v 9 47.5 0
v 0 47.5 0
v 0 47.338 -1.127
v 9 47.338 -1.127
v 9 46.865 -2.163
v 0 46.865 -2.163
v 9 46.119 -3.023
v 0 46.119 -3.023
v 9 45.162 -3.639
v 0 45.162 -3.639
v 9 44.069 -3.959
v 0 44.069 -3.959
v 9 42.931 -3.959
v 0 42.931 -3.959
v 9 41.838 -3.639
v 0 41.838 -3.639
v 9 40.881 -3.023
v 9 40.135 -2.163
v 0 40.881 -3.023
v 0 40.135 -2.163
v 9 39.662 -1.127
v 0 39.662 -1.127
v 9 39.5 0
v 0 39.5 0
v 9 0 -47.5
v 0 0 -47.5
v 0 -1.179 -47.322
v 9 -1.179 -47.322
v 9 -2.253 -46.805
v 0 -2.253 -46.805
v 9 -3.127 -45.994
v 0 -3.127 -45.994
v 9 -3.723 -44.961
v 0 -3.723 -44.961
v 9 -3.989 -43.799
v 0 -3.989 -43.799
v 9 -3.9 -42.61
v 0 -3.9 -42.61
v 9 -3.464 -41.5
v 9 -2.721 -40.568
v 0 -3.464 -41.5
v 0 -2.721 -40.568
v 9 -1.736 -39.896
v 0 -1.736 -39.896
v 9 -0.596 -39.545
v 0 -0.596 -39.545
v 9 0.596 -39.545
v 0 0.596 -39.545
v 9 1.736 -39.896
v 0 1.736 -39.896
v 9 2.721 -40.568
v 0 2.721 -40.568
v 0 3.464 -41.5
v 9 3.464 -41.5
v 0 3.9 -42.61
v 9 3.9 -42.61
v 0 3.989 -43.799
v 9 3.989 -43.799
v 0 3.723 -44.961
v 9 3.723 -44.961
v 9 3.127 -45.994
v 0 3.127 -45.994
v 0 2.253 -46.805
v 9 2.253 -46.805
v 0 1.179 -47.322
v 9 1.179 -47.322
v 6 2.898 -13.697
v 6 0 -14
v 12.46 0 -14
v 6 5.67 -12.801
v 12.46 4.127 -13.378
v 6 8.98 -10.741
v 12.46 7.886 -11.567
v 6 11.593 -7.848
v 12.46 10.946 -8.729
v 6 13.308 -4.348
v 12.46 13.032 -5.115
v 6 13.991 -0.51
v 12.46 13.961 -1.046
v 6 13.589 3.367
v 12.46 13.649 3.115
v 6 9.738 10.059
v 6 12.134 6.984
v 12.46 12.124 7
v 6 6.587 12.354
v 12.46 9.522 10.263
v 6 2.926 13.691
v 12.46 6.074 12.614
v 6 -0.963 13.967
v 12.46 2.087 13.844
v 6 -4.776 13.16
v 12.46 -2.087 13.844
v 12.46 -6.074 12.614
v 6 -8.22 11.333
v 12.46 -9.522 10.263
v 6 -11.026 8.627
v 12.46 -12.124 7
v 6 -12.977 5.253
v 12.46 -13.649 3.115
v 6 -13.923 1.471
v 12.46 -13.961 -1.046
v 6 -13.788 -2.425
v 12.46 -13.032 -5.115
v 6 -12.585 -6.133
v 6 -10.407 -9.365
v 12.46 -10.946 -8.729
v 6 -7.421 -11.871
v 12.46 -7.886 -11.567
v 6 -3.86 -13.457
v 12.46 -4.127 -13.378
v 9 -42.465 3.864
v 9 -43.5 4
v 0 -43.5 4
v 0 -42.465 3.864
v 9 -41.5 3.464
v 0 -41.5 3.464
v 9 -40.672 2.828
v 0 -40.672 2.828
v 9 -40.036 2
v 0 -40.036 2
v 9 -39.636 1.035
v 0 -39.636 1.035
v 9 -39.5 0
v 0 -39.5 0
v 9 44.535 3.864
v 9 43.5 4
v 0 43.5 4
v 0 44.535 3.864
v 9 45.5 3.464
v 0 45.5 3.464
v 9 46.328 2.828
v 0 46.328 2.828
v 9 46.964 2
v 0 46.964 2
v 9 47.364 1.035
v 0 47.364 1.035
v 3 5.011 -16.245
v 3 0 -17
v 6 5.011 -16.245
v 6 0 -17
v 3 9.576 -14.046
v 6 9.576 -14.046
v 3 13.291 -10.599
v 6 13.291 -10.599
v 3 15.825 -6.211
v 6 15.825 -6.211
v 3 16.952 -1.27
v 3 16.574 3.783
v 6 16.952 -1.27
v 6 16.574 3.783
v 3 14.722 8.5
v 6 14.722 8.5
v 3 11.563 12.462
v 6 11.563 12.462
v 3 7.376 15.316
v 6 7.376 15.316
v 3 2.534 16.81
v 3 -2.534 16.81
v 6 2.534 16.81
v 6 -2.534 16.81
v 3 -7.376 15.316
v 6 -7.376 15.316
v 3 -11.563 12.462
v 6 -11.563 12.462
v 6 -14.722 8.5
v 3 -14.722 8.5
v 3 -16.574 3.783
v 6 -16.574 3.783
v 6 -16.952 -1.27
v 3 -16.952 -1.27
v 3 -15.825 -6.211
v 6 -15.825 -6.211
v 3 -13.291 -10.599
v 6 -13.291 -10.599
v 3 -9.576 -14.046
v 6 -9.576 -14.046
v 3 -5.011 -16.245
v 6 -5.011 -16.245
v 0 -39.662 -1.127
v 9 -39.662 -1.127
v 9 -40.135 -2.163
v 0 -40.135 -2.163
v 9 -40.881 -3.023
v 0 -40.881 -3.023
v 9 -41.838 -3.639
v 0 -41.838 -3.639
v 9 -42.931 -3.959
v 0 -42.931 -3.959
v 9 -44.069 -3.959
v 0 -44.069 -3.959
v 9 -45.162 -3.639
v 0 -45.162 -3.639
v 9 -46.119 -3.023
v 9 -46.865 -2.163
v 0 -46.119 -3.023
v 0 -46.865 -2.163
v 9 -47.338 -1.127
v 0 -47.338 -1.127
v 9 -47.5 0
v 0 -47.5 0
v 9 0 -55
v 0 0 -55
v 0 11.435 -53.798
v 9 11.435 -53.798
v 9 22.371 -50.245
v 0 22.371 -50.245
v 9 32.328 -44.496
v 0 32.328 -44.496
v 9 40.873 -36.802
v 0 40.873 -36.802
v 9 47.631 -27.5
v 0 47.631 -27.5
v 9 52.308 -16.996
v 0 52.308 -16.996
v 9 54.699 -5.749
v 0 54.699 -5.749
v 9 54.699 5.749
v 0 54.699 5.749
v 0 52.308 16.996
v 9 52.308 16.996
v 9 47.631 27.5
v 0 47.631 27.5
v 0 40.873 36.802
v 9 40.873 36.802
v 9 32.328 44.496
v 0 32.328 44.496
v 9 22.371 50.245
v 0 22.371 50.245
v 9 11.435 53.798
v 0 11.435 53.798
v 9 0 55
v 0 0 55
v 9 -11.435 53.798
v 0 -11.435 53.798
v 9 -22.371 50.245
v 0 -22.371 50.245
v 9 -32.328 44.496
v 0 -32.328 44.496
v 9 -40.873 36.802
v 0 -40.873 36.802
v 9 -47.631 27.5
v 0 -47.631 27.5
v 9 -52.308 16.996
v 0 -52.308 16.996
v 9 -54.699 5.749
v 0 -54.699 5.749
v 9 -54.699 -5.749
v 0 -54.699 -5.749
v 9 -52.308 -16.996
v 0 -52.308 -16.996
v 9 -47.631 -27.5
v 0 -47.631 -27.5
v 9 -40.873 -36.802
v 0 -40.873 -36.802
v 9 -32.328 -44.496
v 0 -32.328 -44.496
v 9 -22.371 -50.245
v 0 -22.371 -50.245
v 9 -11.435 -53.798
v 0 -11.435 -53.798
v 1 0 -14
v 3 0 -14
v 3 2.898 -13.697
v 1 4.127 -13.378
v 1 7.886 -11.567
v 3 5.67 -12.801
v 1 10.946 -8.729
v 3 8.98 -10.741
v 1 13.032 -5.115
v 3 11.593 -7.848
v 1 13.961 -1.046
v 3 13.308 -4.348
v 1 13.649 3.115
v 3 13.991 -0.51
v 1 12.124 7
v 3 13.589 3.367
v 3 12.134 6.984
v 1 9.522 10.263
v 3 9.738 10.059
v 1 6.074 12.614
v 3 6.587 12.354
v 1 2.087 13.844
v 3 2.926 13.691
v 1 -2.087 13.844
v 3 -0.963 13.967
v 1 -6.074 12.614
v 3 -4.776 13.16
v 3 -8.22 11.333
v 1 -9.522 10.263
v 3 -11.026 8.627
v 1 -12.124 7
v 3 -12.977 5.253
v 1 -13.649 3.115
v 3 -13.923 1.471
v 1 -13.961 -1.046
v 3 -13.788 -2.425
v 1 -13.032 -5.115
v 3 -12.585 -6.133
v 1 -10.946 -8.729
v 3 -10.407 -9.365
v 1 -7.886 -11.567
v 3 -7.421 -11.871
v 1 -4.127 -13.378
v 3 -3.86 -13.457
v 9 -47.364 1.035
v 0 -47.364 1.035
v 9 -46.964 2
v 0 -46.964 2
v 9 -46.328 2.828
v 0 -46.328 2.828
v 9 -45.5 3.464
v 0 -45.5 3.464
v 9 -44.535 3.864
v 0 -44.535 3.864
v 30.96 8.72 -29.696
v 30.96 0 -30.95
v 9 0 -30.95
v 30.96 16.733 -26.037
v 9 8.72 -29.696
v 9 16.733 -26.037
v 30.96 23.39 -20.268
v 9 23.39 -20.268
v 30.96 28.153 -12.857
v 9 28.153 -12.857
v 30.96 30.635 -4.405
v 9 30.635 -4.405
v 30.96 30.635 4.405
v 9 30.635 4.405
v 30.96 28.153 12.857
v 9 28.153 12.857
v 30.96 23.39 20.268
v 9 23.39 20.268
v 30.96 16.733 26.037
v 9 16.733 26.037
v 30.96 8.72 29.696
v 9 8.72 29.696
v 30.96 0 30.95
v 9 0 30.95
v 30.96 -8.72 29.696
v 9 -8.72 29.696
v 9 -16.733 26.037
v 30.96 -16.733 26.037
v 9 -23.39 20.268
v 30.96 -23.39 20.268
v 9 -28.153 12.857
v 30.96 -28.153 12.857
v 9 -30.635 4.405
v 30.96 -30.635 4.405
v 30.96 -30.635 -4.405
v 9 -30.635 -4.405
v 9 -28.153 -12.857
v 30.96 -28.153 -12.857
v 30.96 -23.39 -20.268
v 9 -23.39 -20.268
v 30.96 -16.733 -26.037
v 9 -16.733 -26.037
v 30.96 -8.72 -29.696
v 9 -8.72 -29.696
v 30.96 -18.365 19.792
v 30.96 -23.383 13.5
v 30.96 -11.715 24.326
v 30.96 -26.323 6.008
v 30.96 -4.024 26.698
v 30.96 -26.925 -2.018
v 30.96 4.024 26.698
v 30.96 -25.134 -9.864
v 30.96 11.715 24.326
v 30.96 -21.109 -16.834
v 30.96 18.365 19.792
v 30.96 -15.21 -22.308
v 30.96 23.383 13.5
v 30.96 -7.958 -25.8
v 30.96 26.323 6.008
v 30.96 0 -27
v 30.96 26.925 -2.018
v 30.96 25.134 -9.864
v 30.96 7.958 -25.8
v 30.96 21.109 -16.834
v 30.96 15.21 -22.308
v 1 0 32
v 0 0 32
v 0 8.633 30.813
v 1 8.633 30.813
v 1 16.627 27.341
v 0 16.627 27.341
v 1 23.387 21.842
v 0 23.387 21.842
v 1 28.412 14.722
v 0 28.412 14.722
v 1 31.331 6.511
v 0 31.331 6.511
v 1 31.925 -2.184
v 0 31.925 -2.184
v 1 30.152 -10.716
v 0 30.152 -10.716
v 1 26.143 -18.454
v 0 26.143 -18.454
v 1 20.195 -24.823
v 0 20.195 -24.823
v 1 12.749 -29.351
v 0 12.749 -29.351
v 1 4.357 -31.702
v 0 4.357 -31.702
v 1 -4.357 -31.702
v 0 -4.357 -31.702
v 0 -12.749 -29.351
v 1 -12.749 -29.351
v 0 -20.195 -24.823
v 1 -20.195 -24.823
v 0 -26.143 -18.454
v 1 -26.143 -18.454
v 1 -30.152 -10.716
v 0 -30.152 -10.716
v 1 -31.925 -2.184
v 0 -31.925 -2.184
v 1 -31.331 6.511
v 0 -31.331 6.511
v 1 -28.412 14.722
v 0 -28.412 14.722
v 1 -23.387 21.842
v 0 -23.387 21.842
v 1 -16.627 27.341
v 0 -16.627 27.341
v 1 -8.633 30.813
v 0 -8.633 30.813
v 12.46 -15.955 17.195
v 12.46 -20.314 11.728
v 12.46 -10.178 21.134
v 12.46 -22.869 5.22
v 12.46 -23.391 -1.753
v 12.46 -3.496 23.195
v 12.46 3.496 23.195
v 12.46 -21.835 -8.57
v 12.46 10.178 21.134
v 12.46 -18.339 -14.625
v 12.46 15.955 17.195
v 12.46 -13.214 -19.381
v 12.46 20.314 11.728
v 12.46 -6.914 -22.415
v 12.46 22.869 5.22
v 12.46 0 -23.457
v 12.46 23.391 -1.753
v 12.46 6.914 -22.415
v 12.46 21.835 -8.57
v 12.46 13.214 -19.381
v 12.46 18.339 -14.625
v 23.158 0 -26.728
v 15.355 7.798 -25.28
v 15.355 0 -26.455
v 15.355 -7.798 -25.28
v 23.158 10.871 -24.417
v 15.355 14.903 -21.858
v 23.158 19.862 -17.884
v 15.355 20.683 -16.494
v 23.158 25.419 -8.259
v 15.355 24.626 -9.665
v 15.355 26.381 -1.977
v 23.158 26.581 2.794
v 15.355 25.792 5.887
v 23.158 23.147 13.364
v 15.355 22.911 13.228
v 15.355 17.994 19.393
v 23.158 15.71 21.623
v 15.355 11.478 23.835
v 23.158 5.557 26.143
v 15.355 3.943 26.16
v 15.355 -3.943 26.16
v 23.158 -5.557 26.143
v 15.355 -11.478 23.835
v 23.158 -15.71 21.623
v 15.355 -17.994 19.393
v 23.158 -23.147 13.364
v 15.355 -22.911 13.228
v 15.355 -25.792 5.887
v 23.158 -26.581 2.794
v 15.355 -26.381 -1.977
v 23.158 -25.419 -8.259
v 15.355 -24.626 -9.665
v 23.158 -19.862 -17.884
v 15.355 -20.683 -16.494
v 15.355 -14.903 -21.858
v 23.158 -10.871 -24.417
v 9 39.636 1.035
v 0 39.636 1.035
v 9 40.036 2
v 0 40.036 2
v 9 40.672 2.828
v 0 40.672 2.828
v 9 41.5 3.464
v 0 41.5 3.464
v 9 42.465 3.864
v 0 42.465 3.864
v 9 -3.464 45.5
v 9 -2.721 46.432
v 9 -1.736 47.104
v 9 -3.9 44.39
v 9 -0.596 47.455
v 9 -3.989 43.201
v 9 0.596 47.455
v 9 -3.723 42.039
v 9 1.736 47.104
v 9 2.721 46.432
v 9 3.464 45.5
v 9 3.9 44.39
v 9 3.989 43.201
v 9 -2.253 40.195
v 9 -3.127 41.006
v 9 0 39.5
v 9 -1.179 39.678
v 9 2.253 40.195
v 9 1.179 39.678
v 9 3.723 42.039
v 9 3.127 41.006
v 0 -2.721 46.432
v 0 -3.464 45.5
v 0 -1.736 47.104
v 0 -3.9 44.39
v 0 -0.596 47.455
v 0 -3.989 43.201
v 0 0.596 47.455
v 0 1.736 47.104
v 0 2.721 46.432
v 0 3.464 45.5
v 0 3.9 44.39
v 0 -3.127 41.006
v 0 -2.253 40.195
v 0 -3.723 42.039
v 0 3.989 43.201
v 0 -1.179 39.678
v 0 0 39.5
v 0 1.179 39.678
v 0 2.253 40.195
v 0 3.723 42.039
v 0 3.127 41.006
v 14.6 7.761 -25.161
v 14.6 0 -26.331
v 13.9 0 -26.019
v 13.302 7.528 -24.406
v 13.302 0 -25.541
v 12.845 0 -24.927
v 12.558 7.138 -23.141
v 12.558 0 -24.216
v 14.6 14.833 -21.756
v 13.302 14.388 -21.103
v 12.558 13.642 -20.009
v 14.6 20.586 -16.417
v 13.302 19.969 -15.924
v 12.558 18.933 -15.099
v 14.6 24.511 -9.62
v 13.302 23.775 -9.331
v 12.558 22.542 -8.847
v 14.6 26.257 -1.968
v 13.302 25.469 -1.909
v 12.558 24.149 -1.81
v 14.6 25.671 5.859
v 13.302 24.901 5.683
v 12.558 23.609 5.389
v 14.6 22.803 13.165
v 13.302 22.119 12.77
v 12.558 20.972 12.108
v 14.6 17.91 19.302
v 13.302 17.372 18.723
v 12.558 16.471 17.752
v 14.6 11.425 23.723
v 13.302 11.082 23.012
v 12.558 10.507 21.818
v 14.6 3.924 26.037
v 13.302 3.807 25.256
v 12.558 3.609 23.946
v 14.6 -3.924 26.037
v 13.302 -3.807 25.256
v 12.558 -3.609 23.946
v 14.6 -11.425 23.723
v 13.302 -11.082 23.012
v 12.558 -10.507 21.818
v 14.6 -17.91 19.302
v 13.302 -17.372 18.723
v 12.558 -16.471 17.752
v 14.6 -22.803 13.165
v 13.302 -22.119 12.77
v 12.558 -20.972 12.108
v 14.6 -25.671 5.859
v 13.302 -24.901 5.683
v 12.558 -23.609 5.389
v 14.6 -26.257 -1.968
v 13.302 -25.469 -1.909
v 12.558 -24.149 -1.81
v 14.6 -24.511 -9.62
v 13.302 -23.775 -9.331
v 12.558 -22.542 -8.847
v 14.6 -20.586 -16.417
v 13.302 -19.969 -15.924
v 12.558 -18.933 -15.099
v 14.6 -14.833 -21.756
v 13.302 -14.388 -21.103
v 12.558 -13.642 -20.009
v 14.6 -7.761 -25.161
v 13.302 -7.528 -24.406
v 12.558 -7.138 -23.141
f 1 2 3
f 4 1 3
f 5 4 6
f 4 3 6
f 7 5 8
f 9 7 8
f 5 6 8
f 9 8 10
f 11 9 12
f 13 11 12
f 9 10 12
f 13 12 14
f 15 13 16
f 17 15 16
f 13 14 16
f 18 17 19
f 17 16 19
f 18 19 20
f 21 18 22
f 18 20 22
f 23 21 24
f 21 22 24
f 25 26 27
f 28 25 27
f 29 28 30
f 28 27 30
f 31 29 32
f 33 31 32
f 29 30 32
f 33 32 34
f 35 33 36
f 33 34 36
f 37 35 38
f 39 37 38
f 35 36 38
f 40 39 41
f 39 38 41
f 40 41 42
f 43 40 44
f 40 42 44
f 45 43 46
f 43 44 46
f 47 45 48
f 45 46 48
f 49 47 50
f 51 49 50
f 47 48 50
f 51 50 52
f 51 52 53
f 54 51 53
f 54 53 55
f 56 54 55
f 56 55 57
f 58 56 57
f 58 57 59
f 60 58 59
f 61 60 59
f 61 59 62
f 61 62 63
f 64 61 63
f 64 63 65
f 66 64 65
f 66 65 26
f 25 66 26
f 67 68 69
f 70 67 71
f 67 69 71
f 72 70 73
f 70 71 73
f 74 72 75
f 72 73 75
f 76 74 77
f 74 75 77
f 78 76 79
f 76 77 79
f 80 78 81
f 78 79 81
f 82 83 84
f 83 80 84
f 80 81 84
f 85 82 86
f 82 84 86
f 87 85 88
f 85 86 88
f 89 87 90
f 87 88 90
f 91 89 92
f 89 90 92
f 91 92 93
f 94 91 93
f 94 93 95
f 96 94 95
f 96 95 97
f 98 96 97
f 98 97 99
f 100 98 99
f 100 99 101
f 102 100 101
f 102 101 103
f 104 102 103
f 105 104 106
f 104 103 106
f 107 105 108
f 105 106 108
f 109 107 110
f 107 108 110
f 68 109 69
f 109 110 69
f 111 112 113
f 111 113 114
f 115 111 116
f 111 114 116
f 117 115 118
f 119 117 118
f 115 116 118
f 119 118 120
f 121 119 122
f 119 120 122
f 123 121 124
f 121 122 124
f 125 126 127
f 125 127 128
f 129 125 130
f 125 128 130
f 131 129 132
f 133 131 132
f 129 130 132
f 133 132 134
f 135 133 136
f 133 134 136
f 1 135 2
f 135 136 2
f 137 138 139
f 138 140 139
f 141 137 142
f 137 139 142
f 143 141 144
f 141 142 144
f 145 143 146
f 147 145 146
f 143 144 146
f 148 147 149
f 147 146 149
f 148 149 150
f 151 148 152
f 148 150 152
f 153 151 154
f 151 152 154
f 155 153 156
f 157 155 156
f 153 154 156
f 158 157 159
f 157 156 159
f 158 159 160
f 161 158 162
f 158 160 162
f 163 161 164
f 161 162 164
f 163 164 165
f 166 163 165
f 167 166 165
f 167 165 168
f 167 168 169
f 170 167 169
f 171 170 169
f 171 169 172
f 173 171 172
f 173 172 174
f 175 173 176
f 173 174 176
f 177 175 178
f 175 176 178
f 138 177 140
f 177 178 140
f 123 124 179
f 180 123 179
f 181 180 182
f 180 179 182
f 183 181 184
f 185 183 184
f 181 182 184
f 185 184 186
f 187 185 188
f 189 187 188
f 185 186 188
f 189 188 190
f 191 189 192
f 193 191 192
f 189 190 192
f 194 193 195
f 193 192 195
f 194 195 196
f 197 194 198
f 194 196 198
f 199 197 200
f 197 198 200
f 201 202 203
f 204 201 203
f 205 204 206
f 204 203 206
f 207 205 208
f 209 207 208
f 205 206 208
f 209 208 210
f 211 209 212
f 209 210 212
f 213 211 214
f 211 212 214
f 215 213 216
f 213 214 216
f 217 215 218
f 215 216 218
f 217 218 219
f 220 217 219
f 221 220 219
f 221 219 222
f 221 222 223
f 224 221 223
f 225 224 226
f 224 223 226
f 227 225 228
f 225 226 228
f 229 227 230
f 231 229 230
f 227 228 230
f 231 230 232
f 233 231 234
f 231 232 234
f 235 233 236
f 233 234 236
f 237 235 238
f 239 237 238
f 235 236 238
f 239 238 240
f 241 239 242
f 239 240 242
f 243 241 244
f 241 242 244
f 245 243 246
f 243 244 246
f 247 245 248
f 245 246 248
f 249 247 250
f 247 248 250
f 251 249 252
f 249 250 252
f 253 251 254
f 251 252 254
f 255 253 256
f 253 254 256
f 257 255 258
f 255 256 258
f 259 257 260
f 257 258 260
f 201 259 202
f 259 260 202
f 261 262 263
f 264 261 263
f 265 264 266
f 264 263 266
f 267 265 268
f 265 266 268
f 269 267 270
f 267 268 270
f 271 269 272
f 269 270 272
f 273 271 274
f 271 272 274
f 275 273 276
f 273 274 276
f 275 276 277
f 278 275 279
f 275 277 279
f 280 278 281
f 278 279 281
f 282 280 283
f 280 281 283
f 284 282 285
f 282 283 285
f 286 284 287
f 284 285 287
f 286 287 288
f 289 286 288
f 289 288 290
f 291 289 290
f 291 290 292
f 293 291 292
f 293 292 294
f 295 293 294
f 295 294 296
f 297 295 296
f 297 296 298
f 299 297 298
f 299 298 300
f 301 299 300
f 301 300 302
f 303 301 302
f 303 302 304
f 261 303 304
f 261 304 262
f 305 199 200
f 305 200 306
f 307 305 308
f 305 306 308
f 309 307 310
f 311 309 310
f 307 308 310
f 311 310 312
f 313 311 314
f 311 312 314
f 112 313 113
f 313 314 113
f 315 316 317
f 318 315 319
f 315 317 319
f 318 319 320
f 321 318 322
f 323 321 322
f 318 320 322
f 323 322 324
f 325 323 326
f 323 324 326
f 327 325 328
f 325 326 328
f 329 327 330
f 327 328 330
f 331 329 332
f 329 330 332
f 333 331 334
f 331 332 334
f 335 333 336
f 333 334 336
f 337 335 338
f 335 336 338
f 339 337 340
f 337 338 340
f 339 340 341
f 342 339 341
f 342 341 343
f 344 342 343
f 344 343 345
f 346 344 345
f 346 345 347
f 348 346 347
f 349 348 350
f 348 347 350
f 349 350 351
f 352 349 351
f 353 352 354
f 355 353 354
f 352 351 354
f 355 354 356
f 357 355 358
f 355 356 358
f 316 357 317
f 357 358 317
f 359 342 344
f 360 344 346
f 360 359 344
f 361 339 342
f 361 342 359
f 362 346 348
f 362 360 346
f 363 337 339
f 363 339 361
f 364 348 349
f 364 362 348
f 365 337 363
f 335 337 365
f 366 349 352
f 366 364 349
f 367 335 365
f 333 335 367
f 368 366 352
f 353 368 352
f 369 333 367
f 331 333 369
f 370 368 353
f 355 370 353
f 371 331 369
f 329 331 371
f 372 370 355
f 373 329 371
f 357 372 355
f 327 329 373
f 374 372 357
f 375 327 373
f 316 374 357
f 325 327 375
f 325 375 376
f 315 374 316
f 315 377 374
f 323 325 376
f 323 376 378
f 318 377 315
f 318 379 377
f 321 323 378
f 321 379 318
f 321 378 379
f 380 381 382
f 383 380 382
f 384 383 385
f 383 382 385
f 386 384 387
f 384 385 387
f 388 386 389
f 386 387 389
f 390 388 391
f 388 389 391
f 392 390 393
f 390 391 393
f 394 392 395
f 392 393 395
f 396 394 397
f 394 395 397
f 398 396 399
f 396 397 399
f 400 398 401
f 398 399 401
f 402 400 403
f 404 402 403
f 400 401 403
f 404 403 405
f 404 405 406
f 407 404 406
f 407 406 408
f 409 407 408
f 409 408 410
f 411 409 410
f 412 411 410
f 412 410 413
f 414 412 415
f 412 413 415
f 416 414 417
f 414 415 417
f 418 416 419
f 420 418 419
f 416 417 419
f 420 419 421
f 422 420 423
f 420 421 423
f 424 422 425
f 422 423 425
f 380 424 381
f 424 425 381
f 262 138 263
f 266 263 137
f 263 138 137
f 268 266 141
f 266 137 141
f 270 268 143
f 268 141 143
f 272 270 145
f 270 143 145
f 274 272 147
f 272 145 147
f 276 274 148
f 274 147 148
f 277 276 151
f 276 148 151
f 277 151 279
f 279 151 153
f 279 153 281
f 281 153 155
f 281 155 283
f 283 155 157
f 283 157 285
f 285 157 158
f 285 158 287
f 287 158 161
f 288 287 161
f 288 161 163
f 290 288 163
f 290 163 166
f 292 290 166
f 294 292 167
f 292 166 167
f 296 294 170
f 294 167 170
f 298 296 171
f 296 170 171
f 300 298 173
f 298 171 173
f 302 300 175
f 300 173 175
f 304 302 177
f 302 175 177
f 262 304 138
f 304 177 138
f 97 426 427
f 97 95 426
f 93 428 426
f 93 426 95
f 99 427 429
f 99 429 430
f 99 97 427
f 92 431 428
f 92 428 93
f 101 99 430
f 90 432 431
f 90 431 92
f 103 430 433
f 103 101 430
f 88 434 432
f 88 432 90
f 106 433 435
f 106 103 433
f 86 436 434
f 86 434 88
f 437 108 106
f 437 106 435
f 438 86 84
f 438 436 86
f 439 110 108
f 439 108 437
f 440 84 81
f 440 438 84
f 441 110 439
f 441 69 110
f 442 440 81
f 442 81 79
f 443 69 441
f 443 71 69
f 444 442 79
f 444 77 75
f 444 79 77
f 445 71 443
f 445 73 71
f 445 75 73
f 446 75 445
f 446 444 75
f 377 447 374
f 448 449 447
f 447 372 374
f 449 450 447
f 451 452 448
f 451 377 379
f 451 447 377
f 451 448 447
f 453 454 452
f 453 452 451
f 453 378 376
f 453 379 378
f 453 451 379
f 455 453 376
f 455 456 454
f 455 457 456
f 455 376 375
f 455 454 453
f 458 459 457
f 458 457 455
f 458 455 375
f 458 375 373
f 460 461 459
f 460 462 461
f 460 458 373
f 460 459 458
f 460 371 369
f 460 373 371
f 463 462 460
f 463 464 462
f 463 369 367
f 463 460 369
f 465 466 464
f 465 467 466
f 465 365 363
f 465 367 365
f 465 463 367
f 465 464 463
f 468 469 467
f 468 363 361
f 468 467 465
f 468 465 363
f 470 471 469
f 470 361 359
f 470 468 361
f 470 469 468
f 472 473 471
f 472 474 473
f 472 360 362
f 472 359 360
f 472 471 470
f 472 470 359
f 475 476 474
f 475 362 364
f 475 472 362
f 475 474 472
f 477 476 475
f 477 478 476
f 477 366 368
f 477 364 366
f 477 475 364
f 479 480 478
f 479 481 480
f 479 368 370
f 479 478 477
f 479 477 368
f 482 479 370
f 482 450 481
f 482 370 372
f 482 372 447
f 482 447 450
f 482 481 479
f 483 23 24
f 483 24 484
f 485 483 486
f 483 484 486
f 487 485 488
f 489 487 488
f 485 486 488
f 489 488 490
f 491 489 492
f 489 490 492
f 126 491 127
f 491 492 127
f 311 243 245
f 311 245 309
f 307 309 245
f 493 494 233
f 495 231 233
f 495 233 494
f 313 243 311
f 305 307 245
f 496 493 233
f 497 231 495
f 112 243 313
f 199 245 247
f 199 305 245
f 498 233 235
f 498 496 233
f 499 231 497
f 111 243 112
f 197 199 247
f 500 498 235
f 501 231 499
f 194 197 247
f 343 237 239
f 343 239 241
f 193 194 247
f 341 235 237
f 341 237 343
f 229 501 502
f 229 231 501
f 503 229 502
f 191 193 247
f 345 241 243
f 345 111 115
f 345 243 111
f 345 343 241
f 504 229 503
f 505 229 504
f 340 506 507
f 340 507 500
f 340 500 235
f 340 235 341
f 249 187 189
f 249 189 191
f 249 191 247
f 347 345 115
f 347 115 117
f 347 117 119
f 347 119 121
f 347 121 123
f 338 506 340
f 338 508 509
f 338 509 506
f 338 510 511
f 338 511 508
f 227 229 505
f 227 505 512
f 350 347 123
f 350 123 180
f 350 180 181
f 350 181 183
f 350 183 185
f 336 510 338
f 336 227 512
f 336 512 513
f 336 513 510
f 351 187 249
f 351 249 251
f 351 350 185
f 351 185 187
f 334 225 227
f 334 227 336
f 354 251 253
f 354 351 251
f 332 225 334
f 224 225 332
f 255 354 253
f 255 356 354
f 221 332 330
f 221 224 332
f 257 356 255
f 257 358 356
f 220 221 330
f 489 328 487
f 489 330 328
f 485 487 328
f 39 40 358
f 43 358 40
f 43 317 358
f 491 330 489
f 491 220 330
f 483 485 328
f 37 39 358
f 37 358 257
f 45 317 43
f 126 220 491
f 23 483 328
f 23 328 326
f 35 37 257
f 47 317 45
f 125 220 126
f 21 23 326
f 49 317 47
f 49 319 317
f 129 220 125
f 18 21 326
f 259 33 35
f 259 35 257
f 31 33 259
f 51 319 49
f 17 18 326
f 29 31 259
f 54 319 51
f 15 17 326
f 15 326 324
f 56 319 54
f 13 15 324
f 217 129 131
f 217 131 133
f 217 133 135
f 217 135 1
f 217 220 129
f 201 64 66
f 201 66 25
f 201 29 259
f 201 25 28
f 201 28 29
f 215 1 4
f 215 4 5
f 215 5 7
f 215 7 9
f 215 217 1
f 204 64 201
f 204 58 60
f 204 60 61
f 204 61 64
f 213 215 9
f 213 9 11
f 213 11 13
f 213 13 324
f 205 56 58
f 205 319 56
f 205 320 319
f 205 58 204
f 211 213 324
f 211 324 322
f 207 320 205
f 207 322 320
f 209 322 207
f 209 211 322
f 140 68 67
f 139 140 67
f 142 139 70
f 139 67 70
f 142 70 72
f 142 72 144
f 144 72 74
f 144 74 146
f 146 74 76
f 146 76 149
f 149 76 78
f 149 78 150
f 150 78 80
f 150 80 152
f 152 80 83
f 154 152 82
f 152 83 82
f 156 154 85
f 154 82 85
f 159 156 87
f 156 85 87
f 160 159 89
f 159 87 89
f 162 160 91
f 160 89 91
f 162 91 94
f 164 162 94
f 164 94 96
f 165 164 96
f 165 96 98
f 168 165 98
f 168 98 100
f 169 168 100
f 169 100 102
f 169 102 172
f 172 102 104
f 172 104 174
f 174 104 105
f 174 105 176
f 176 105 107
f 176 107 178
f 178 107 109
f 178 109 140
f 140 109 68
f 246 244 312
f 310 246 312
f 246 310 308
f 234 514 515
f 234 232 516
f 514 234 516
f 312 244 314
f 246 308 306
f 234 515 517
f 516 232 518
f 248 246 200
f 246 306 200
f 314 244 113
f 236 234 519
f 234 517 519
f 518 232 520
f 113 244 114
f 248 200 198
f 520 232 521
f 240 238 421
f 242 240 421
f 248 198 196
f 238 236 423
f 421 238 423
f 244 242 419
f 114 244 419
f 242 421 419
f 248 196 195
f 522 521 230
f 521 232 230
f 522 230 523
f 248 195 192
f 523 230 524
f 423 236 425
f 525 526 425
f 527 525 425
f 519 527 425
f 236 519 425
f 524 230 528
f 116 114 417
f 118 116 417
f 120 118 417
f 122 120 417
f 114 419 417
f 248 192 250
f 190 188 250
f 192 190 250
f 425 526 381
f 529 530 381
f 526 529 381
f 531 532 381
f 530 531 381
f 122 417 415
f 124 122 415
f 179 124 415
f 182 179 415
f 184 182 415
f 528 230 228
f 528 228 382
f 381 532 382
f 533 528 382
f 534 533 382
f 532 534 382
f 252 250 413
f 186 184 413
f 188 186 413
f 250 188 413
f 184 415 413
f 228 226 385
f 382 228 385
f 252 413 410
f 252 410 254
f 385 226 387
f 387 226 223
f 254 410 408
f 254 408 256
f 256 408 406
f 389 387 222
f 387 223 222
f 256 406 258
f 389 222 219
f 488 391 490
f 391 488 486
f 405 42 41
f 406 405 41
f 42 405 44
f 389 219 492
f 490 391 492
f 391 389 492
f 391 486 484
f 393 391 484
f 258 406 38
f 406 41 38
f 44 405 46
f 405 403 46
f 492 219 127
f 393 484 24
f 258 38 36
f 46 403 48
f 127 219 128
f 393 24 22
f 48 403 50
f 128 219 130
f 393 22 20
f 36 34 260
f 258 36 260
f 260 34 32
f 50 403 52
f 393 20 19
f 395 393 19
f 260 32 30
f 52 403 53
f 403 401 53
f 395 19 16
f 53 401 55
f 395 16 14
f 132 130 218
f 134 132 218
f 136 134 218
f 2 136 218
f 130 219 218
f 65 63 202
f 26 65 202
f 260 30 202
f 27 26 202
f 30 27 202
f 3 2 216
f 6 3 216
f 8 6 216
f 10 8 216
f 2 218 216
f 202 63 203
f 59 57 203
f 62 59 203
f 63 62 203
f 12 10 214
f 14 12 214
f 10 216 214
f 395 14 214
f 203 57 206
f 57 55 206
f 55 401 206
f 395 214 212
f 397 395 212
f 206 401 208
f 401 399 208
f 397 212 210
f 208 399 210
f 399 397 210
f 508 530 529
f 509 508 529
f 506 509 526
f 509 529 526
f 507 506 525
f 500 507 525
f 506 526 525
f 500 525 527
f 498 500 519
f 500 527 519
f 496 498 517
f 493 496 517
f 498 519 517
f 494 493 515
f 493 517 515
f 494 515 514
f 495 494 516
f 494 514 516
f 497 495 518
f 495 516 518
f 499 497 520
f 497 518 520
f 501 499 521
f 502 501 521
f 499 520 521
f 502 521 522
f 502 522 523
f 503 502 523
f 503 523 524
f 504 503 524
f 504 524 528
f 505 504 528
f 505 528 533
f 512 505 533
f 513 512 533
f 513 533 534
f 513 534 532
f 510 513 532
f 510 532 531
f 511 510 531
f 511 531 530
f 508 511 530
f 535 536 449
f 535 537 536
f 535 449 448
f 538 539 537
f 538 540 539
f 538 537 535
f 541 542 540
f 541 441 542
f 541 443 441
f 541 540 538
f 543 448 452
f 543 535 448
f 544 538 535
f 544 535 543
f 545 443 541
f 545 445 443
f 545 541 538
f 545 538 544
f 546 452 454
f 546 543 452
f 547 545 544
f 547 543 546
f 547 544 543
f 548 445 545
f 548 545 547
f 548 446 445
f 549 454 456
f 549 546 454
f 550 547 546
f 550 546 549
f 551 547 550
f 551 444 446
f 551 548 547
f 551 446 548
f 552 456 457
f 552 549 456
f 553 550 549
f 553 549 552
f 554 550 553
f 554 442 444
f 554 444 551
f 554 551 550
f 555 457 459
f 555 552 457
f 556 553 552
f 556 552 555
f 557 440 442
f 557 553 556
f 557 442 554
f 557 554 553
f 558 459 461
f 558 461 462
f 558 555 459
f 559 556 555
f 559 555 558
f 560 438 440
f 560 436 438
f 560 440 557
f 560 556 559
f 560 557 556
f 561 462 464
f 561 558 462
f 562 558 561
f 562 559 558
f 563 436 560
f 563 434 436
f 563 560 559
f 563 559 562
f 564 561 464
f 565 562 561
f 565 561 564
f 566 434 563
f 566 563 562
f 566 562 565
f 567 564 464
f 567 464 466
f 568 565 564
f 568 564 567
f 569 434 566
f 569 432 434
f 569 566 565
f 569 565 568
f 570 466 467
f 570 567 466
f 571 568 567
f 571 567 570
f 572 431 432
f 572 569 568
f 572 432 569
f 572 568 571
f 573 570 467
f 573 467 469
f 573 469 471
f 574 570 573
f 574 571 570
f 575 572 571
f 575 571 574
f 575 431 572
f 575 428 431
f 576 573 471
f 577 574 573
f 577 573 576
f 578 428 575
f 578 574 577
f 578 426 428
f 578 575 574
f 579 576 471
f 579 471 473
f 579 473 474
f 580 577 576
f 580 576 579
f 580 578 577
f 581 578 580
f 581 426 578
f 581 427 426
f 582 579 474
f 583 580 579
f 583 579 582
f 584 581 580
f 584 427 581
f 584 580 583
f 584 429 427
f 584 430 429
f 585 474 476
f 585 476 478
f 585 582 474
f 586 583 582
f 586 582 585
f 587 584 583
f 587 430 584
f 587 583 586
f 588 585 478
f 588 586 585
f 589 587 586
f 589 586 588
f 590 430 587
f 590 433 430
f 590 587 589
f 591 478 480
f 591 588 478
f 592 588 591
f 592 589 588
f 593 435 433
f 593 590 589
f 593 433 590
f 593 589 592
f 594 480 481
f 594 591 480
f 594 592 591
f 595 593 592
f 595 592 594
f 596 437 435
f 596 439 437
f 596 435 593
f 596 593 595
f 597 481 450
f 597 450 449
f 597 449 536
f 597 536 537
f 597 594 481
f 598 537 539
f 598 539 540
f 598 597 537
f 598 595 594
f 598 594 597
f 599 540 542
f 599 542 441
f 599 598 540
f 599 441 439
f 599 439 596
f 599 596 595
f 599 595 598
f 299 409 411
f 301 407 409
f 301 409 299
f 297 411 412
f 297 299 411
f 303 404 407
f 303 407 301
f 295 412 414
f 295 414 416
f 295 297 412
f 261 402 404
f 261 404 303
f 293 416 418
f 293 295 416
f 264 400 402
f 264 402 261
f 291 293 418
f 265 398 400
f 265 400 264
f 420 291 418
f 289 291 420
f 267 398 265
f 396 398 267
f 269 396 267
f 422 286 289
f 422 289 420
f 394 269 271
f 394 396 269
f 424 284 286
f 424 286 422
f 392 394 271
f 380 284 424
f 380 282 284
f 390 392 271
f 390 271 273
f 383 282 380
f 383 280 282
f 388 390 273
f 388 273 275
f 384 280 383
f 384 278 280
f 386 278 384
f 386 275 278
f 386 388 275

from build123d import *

# Parameters (mm, degrees)
SKETCH_1_R          = 55
EXTRUDE_1_DEPTH     = 9
SKETCH_2_R          = 30.95
EXTRUDE_2_DEPTH     = 21.96
SKETCH_3_R          = 27
CUT_EXTRUDE_1_DEPTH = 18.5
CUT_EXTRUDE_1_TAPER = 2
FILLET_1_R          = 3
SKETCH_4_R          = 14
CUT_EXTRUDE_2_DEPTH = 18.5
SKETCH_5_W          = 3
SKETCH_5_H          = 6
SKETCH_7_R          = 32
CUT_EXTRUDE_3_DEPTH = 1
CUT_EXTRUDE_4_DEPTH = 20


with BuildPart() as part:
    # 草图1 → 凸台-拉伸1 (new body)
    with BuildSketch(Plane(origin=(0, 0, 0), x_dir=(0, 0, -1), z_dir=(1, 0, 0))):
        Circle(SKETCH_1_R)
    extrude(amount=EXTRUDE_1_DEPTH)

    # 草图2 → 凸台-拉伸2 (add)
    with BuildSketch(Plane(origin=(9, 0, 0), x_dir=(0, 0, -1), z_dir=(1, 0, 0))):
        Circle(SKETCH_2_R)
    extrude(amount=EXTRUDE_2_DEPTH)

    # 草图3 → 切除-拉伸1 (cut)
    with BuildSketch(Plane(origin=(30.96, 0, 0), x_dir=(0, 0, -1), z_dir=(1, 0, 0))):
        Circle(SKETCH_3_R)
    extrude(amount=-CUT_EXTRUDE_1_DEPTH, taper=CUT_EXTRUDE_1_TAPER, mode=Mode.SUBTRACT)

    # 圆角1
    fillet_1_edges = [part.edges().sort_by_distance(p)[0] for p in [
        (12.46, 0, 26.353965764),
    ]]
    fillet(fillet_1_edges, radius=FILLET_1_R)

    # 草图4 → 切除-拉伸2 (cut)
    with BuildSketch(Plane(origin=(12.46, 0, 0), x_dir=(0, 0, -1), z_dir=(1, 0, 0))):
        Circle(SKETCH_4_R)
    extrude(amount=-CUT_EXTRUDE_2_DEPTH, mode=Mode.SUBTRACT)

    # 切除-扫描1: sweep along a path in 草图6
    with BuildLine(Plane(origin=(4.5, 0, 14), x_dir=(0, 0, -1), z_dir=(1, 0, 0))) as sweep_1_path:
        CenterArc((14, 0), 14, 0, 360)
    # 草图5 → 切除-扫描1 (sweep, cut)
    with BuildSketch(Plane(origin=(0, 0, 0), x_dir=(1, 0, 0), z_dir=(0, 1, 0))):
        with Locations((4.5, -14)):
            Rectangle(SKETCH_5_W, SKETCH_5_H)
    sweep(path=sweep_1_path.line, mode=Mode.SUBTRACT)

    # 草图7 → 切除-拉伸3 (cut)
    with BuildSketch(Plane.ZY):
        Circle(SKETCH_7_R)
    extrude(amount=-CUT_EXTRUDE_3_DEPTH, mode=Mode.SUBTRACT)

    # 草图8 → 切除-拉伸4 (cut)
    with BuildSketch(Plane.ZY):
        with BuildLine():
            ThreePointArc((0, 47.5), (-4, 43.5), (0, 39.5))
            Line((0, 39.5), (0, 47.5))
        make_face()
        with BuildLine():
            Line((0, 47.5), (0, 39.5))
            ThreePointArc((0, 39.5), (2.828427125, 40.671572875), (4, 43.5))
            ThreePointArc((4, 43.5), (2.828427125, 46.328427125), (0, 47.5))
        make_face()
        with BuildLine():
            ThreePointArc((47.5, 0), (43.5, 4), (39.5, 0))
            Line((39.5, 0), (47.5, 0))
        make_face()
        with BuildLine():
            Line((47.5, 0), (39.5, 0))
            ThreePointArc((39.5, 0), (43.5, -4), (47.5, 0))
        make_face()
        with BuildLine():
            ThreePointArc((0, -39.5), (-4, -43.5), (0, -47.5))
            Line((0, -47.5), (0, -39.5))
        make_face()
        with BuildLine():
            Line((0, -39.5), (0, -47.5))
            ThreePointArc((0, -47.5), (2.828427125, -46.328427125), (4, -43.5))
            ThreePointArc((4, -43.5), (2.828427125, -40.671572875), (0, -39.5))
        make_face()
        with BuildLine():
            ThreePointArc((-39.5, 0), (-43.5, 4), (-47.5, 0))
            Line((-47.5, 0), (-39.5, 0))
        make_face()
        with BuildLine():
            Line((-39.5, 0), (-47.5, 0))
            ThreePointArc((-47.5, 0), (-43.5, -4), (-39.5, 0))
        make_face()
    extrude(amount=-CUT_EXTRUDE_4_DEPTH, mode=Mode.SUBTRACT)


solid = part.part
